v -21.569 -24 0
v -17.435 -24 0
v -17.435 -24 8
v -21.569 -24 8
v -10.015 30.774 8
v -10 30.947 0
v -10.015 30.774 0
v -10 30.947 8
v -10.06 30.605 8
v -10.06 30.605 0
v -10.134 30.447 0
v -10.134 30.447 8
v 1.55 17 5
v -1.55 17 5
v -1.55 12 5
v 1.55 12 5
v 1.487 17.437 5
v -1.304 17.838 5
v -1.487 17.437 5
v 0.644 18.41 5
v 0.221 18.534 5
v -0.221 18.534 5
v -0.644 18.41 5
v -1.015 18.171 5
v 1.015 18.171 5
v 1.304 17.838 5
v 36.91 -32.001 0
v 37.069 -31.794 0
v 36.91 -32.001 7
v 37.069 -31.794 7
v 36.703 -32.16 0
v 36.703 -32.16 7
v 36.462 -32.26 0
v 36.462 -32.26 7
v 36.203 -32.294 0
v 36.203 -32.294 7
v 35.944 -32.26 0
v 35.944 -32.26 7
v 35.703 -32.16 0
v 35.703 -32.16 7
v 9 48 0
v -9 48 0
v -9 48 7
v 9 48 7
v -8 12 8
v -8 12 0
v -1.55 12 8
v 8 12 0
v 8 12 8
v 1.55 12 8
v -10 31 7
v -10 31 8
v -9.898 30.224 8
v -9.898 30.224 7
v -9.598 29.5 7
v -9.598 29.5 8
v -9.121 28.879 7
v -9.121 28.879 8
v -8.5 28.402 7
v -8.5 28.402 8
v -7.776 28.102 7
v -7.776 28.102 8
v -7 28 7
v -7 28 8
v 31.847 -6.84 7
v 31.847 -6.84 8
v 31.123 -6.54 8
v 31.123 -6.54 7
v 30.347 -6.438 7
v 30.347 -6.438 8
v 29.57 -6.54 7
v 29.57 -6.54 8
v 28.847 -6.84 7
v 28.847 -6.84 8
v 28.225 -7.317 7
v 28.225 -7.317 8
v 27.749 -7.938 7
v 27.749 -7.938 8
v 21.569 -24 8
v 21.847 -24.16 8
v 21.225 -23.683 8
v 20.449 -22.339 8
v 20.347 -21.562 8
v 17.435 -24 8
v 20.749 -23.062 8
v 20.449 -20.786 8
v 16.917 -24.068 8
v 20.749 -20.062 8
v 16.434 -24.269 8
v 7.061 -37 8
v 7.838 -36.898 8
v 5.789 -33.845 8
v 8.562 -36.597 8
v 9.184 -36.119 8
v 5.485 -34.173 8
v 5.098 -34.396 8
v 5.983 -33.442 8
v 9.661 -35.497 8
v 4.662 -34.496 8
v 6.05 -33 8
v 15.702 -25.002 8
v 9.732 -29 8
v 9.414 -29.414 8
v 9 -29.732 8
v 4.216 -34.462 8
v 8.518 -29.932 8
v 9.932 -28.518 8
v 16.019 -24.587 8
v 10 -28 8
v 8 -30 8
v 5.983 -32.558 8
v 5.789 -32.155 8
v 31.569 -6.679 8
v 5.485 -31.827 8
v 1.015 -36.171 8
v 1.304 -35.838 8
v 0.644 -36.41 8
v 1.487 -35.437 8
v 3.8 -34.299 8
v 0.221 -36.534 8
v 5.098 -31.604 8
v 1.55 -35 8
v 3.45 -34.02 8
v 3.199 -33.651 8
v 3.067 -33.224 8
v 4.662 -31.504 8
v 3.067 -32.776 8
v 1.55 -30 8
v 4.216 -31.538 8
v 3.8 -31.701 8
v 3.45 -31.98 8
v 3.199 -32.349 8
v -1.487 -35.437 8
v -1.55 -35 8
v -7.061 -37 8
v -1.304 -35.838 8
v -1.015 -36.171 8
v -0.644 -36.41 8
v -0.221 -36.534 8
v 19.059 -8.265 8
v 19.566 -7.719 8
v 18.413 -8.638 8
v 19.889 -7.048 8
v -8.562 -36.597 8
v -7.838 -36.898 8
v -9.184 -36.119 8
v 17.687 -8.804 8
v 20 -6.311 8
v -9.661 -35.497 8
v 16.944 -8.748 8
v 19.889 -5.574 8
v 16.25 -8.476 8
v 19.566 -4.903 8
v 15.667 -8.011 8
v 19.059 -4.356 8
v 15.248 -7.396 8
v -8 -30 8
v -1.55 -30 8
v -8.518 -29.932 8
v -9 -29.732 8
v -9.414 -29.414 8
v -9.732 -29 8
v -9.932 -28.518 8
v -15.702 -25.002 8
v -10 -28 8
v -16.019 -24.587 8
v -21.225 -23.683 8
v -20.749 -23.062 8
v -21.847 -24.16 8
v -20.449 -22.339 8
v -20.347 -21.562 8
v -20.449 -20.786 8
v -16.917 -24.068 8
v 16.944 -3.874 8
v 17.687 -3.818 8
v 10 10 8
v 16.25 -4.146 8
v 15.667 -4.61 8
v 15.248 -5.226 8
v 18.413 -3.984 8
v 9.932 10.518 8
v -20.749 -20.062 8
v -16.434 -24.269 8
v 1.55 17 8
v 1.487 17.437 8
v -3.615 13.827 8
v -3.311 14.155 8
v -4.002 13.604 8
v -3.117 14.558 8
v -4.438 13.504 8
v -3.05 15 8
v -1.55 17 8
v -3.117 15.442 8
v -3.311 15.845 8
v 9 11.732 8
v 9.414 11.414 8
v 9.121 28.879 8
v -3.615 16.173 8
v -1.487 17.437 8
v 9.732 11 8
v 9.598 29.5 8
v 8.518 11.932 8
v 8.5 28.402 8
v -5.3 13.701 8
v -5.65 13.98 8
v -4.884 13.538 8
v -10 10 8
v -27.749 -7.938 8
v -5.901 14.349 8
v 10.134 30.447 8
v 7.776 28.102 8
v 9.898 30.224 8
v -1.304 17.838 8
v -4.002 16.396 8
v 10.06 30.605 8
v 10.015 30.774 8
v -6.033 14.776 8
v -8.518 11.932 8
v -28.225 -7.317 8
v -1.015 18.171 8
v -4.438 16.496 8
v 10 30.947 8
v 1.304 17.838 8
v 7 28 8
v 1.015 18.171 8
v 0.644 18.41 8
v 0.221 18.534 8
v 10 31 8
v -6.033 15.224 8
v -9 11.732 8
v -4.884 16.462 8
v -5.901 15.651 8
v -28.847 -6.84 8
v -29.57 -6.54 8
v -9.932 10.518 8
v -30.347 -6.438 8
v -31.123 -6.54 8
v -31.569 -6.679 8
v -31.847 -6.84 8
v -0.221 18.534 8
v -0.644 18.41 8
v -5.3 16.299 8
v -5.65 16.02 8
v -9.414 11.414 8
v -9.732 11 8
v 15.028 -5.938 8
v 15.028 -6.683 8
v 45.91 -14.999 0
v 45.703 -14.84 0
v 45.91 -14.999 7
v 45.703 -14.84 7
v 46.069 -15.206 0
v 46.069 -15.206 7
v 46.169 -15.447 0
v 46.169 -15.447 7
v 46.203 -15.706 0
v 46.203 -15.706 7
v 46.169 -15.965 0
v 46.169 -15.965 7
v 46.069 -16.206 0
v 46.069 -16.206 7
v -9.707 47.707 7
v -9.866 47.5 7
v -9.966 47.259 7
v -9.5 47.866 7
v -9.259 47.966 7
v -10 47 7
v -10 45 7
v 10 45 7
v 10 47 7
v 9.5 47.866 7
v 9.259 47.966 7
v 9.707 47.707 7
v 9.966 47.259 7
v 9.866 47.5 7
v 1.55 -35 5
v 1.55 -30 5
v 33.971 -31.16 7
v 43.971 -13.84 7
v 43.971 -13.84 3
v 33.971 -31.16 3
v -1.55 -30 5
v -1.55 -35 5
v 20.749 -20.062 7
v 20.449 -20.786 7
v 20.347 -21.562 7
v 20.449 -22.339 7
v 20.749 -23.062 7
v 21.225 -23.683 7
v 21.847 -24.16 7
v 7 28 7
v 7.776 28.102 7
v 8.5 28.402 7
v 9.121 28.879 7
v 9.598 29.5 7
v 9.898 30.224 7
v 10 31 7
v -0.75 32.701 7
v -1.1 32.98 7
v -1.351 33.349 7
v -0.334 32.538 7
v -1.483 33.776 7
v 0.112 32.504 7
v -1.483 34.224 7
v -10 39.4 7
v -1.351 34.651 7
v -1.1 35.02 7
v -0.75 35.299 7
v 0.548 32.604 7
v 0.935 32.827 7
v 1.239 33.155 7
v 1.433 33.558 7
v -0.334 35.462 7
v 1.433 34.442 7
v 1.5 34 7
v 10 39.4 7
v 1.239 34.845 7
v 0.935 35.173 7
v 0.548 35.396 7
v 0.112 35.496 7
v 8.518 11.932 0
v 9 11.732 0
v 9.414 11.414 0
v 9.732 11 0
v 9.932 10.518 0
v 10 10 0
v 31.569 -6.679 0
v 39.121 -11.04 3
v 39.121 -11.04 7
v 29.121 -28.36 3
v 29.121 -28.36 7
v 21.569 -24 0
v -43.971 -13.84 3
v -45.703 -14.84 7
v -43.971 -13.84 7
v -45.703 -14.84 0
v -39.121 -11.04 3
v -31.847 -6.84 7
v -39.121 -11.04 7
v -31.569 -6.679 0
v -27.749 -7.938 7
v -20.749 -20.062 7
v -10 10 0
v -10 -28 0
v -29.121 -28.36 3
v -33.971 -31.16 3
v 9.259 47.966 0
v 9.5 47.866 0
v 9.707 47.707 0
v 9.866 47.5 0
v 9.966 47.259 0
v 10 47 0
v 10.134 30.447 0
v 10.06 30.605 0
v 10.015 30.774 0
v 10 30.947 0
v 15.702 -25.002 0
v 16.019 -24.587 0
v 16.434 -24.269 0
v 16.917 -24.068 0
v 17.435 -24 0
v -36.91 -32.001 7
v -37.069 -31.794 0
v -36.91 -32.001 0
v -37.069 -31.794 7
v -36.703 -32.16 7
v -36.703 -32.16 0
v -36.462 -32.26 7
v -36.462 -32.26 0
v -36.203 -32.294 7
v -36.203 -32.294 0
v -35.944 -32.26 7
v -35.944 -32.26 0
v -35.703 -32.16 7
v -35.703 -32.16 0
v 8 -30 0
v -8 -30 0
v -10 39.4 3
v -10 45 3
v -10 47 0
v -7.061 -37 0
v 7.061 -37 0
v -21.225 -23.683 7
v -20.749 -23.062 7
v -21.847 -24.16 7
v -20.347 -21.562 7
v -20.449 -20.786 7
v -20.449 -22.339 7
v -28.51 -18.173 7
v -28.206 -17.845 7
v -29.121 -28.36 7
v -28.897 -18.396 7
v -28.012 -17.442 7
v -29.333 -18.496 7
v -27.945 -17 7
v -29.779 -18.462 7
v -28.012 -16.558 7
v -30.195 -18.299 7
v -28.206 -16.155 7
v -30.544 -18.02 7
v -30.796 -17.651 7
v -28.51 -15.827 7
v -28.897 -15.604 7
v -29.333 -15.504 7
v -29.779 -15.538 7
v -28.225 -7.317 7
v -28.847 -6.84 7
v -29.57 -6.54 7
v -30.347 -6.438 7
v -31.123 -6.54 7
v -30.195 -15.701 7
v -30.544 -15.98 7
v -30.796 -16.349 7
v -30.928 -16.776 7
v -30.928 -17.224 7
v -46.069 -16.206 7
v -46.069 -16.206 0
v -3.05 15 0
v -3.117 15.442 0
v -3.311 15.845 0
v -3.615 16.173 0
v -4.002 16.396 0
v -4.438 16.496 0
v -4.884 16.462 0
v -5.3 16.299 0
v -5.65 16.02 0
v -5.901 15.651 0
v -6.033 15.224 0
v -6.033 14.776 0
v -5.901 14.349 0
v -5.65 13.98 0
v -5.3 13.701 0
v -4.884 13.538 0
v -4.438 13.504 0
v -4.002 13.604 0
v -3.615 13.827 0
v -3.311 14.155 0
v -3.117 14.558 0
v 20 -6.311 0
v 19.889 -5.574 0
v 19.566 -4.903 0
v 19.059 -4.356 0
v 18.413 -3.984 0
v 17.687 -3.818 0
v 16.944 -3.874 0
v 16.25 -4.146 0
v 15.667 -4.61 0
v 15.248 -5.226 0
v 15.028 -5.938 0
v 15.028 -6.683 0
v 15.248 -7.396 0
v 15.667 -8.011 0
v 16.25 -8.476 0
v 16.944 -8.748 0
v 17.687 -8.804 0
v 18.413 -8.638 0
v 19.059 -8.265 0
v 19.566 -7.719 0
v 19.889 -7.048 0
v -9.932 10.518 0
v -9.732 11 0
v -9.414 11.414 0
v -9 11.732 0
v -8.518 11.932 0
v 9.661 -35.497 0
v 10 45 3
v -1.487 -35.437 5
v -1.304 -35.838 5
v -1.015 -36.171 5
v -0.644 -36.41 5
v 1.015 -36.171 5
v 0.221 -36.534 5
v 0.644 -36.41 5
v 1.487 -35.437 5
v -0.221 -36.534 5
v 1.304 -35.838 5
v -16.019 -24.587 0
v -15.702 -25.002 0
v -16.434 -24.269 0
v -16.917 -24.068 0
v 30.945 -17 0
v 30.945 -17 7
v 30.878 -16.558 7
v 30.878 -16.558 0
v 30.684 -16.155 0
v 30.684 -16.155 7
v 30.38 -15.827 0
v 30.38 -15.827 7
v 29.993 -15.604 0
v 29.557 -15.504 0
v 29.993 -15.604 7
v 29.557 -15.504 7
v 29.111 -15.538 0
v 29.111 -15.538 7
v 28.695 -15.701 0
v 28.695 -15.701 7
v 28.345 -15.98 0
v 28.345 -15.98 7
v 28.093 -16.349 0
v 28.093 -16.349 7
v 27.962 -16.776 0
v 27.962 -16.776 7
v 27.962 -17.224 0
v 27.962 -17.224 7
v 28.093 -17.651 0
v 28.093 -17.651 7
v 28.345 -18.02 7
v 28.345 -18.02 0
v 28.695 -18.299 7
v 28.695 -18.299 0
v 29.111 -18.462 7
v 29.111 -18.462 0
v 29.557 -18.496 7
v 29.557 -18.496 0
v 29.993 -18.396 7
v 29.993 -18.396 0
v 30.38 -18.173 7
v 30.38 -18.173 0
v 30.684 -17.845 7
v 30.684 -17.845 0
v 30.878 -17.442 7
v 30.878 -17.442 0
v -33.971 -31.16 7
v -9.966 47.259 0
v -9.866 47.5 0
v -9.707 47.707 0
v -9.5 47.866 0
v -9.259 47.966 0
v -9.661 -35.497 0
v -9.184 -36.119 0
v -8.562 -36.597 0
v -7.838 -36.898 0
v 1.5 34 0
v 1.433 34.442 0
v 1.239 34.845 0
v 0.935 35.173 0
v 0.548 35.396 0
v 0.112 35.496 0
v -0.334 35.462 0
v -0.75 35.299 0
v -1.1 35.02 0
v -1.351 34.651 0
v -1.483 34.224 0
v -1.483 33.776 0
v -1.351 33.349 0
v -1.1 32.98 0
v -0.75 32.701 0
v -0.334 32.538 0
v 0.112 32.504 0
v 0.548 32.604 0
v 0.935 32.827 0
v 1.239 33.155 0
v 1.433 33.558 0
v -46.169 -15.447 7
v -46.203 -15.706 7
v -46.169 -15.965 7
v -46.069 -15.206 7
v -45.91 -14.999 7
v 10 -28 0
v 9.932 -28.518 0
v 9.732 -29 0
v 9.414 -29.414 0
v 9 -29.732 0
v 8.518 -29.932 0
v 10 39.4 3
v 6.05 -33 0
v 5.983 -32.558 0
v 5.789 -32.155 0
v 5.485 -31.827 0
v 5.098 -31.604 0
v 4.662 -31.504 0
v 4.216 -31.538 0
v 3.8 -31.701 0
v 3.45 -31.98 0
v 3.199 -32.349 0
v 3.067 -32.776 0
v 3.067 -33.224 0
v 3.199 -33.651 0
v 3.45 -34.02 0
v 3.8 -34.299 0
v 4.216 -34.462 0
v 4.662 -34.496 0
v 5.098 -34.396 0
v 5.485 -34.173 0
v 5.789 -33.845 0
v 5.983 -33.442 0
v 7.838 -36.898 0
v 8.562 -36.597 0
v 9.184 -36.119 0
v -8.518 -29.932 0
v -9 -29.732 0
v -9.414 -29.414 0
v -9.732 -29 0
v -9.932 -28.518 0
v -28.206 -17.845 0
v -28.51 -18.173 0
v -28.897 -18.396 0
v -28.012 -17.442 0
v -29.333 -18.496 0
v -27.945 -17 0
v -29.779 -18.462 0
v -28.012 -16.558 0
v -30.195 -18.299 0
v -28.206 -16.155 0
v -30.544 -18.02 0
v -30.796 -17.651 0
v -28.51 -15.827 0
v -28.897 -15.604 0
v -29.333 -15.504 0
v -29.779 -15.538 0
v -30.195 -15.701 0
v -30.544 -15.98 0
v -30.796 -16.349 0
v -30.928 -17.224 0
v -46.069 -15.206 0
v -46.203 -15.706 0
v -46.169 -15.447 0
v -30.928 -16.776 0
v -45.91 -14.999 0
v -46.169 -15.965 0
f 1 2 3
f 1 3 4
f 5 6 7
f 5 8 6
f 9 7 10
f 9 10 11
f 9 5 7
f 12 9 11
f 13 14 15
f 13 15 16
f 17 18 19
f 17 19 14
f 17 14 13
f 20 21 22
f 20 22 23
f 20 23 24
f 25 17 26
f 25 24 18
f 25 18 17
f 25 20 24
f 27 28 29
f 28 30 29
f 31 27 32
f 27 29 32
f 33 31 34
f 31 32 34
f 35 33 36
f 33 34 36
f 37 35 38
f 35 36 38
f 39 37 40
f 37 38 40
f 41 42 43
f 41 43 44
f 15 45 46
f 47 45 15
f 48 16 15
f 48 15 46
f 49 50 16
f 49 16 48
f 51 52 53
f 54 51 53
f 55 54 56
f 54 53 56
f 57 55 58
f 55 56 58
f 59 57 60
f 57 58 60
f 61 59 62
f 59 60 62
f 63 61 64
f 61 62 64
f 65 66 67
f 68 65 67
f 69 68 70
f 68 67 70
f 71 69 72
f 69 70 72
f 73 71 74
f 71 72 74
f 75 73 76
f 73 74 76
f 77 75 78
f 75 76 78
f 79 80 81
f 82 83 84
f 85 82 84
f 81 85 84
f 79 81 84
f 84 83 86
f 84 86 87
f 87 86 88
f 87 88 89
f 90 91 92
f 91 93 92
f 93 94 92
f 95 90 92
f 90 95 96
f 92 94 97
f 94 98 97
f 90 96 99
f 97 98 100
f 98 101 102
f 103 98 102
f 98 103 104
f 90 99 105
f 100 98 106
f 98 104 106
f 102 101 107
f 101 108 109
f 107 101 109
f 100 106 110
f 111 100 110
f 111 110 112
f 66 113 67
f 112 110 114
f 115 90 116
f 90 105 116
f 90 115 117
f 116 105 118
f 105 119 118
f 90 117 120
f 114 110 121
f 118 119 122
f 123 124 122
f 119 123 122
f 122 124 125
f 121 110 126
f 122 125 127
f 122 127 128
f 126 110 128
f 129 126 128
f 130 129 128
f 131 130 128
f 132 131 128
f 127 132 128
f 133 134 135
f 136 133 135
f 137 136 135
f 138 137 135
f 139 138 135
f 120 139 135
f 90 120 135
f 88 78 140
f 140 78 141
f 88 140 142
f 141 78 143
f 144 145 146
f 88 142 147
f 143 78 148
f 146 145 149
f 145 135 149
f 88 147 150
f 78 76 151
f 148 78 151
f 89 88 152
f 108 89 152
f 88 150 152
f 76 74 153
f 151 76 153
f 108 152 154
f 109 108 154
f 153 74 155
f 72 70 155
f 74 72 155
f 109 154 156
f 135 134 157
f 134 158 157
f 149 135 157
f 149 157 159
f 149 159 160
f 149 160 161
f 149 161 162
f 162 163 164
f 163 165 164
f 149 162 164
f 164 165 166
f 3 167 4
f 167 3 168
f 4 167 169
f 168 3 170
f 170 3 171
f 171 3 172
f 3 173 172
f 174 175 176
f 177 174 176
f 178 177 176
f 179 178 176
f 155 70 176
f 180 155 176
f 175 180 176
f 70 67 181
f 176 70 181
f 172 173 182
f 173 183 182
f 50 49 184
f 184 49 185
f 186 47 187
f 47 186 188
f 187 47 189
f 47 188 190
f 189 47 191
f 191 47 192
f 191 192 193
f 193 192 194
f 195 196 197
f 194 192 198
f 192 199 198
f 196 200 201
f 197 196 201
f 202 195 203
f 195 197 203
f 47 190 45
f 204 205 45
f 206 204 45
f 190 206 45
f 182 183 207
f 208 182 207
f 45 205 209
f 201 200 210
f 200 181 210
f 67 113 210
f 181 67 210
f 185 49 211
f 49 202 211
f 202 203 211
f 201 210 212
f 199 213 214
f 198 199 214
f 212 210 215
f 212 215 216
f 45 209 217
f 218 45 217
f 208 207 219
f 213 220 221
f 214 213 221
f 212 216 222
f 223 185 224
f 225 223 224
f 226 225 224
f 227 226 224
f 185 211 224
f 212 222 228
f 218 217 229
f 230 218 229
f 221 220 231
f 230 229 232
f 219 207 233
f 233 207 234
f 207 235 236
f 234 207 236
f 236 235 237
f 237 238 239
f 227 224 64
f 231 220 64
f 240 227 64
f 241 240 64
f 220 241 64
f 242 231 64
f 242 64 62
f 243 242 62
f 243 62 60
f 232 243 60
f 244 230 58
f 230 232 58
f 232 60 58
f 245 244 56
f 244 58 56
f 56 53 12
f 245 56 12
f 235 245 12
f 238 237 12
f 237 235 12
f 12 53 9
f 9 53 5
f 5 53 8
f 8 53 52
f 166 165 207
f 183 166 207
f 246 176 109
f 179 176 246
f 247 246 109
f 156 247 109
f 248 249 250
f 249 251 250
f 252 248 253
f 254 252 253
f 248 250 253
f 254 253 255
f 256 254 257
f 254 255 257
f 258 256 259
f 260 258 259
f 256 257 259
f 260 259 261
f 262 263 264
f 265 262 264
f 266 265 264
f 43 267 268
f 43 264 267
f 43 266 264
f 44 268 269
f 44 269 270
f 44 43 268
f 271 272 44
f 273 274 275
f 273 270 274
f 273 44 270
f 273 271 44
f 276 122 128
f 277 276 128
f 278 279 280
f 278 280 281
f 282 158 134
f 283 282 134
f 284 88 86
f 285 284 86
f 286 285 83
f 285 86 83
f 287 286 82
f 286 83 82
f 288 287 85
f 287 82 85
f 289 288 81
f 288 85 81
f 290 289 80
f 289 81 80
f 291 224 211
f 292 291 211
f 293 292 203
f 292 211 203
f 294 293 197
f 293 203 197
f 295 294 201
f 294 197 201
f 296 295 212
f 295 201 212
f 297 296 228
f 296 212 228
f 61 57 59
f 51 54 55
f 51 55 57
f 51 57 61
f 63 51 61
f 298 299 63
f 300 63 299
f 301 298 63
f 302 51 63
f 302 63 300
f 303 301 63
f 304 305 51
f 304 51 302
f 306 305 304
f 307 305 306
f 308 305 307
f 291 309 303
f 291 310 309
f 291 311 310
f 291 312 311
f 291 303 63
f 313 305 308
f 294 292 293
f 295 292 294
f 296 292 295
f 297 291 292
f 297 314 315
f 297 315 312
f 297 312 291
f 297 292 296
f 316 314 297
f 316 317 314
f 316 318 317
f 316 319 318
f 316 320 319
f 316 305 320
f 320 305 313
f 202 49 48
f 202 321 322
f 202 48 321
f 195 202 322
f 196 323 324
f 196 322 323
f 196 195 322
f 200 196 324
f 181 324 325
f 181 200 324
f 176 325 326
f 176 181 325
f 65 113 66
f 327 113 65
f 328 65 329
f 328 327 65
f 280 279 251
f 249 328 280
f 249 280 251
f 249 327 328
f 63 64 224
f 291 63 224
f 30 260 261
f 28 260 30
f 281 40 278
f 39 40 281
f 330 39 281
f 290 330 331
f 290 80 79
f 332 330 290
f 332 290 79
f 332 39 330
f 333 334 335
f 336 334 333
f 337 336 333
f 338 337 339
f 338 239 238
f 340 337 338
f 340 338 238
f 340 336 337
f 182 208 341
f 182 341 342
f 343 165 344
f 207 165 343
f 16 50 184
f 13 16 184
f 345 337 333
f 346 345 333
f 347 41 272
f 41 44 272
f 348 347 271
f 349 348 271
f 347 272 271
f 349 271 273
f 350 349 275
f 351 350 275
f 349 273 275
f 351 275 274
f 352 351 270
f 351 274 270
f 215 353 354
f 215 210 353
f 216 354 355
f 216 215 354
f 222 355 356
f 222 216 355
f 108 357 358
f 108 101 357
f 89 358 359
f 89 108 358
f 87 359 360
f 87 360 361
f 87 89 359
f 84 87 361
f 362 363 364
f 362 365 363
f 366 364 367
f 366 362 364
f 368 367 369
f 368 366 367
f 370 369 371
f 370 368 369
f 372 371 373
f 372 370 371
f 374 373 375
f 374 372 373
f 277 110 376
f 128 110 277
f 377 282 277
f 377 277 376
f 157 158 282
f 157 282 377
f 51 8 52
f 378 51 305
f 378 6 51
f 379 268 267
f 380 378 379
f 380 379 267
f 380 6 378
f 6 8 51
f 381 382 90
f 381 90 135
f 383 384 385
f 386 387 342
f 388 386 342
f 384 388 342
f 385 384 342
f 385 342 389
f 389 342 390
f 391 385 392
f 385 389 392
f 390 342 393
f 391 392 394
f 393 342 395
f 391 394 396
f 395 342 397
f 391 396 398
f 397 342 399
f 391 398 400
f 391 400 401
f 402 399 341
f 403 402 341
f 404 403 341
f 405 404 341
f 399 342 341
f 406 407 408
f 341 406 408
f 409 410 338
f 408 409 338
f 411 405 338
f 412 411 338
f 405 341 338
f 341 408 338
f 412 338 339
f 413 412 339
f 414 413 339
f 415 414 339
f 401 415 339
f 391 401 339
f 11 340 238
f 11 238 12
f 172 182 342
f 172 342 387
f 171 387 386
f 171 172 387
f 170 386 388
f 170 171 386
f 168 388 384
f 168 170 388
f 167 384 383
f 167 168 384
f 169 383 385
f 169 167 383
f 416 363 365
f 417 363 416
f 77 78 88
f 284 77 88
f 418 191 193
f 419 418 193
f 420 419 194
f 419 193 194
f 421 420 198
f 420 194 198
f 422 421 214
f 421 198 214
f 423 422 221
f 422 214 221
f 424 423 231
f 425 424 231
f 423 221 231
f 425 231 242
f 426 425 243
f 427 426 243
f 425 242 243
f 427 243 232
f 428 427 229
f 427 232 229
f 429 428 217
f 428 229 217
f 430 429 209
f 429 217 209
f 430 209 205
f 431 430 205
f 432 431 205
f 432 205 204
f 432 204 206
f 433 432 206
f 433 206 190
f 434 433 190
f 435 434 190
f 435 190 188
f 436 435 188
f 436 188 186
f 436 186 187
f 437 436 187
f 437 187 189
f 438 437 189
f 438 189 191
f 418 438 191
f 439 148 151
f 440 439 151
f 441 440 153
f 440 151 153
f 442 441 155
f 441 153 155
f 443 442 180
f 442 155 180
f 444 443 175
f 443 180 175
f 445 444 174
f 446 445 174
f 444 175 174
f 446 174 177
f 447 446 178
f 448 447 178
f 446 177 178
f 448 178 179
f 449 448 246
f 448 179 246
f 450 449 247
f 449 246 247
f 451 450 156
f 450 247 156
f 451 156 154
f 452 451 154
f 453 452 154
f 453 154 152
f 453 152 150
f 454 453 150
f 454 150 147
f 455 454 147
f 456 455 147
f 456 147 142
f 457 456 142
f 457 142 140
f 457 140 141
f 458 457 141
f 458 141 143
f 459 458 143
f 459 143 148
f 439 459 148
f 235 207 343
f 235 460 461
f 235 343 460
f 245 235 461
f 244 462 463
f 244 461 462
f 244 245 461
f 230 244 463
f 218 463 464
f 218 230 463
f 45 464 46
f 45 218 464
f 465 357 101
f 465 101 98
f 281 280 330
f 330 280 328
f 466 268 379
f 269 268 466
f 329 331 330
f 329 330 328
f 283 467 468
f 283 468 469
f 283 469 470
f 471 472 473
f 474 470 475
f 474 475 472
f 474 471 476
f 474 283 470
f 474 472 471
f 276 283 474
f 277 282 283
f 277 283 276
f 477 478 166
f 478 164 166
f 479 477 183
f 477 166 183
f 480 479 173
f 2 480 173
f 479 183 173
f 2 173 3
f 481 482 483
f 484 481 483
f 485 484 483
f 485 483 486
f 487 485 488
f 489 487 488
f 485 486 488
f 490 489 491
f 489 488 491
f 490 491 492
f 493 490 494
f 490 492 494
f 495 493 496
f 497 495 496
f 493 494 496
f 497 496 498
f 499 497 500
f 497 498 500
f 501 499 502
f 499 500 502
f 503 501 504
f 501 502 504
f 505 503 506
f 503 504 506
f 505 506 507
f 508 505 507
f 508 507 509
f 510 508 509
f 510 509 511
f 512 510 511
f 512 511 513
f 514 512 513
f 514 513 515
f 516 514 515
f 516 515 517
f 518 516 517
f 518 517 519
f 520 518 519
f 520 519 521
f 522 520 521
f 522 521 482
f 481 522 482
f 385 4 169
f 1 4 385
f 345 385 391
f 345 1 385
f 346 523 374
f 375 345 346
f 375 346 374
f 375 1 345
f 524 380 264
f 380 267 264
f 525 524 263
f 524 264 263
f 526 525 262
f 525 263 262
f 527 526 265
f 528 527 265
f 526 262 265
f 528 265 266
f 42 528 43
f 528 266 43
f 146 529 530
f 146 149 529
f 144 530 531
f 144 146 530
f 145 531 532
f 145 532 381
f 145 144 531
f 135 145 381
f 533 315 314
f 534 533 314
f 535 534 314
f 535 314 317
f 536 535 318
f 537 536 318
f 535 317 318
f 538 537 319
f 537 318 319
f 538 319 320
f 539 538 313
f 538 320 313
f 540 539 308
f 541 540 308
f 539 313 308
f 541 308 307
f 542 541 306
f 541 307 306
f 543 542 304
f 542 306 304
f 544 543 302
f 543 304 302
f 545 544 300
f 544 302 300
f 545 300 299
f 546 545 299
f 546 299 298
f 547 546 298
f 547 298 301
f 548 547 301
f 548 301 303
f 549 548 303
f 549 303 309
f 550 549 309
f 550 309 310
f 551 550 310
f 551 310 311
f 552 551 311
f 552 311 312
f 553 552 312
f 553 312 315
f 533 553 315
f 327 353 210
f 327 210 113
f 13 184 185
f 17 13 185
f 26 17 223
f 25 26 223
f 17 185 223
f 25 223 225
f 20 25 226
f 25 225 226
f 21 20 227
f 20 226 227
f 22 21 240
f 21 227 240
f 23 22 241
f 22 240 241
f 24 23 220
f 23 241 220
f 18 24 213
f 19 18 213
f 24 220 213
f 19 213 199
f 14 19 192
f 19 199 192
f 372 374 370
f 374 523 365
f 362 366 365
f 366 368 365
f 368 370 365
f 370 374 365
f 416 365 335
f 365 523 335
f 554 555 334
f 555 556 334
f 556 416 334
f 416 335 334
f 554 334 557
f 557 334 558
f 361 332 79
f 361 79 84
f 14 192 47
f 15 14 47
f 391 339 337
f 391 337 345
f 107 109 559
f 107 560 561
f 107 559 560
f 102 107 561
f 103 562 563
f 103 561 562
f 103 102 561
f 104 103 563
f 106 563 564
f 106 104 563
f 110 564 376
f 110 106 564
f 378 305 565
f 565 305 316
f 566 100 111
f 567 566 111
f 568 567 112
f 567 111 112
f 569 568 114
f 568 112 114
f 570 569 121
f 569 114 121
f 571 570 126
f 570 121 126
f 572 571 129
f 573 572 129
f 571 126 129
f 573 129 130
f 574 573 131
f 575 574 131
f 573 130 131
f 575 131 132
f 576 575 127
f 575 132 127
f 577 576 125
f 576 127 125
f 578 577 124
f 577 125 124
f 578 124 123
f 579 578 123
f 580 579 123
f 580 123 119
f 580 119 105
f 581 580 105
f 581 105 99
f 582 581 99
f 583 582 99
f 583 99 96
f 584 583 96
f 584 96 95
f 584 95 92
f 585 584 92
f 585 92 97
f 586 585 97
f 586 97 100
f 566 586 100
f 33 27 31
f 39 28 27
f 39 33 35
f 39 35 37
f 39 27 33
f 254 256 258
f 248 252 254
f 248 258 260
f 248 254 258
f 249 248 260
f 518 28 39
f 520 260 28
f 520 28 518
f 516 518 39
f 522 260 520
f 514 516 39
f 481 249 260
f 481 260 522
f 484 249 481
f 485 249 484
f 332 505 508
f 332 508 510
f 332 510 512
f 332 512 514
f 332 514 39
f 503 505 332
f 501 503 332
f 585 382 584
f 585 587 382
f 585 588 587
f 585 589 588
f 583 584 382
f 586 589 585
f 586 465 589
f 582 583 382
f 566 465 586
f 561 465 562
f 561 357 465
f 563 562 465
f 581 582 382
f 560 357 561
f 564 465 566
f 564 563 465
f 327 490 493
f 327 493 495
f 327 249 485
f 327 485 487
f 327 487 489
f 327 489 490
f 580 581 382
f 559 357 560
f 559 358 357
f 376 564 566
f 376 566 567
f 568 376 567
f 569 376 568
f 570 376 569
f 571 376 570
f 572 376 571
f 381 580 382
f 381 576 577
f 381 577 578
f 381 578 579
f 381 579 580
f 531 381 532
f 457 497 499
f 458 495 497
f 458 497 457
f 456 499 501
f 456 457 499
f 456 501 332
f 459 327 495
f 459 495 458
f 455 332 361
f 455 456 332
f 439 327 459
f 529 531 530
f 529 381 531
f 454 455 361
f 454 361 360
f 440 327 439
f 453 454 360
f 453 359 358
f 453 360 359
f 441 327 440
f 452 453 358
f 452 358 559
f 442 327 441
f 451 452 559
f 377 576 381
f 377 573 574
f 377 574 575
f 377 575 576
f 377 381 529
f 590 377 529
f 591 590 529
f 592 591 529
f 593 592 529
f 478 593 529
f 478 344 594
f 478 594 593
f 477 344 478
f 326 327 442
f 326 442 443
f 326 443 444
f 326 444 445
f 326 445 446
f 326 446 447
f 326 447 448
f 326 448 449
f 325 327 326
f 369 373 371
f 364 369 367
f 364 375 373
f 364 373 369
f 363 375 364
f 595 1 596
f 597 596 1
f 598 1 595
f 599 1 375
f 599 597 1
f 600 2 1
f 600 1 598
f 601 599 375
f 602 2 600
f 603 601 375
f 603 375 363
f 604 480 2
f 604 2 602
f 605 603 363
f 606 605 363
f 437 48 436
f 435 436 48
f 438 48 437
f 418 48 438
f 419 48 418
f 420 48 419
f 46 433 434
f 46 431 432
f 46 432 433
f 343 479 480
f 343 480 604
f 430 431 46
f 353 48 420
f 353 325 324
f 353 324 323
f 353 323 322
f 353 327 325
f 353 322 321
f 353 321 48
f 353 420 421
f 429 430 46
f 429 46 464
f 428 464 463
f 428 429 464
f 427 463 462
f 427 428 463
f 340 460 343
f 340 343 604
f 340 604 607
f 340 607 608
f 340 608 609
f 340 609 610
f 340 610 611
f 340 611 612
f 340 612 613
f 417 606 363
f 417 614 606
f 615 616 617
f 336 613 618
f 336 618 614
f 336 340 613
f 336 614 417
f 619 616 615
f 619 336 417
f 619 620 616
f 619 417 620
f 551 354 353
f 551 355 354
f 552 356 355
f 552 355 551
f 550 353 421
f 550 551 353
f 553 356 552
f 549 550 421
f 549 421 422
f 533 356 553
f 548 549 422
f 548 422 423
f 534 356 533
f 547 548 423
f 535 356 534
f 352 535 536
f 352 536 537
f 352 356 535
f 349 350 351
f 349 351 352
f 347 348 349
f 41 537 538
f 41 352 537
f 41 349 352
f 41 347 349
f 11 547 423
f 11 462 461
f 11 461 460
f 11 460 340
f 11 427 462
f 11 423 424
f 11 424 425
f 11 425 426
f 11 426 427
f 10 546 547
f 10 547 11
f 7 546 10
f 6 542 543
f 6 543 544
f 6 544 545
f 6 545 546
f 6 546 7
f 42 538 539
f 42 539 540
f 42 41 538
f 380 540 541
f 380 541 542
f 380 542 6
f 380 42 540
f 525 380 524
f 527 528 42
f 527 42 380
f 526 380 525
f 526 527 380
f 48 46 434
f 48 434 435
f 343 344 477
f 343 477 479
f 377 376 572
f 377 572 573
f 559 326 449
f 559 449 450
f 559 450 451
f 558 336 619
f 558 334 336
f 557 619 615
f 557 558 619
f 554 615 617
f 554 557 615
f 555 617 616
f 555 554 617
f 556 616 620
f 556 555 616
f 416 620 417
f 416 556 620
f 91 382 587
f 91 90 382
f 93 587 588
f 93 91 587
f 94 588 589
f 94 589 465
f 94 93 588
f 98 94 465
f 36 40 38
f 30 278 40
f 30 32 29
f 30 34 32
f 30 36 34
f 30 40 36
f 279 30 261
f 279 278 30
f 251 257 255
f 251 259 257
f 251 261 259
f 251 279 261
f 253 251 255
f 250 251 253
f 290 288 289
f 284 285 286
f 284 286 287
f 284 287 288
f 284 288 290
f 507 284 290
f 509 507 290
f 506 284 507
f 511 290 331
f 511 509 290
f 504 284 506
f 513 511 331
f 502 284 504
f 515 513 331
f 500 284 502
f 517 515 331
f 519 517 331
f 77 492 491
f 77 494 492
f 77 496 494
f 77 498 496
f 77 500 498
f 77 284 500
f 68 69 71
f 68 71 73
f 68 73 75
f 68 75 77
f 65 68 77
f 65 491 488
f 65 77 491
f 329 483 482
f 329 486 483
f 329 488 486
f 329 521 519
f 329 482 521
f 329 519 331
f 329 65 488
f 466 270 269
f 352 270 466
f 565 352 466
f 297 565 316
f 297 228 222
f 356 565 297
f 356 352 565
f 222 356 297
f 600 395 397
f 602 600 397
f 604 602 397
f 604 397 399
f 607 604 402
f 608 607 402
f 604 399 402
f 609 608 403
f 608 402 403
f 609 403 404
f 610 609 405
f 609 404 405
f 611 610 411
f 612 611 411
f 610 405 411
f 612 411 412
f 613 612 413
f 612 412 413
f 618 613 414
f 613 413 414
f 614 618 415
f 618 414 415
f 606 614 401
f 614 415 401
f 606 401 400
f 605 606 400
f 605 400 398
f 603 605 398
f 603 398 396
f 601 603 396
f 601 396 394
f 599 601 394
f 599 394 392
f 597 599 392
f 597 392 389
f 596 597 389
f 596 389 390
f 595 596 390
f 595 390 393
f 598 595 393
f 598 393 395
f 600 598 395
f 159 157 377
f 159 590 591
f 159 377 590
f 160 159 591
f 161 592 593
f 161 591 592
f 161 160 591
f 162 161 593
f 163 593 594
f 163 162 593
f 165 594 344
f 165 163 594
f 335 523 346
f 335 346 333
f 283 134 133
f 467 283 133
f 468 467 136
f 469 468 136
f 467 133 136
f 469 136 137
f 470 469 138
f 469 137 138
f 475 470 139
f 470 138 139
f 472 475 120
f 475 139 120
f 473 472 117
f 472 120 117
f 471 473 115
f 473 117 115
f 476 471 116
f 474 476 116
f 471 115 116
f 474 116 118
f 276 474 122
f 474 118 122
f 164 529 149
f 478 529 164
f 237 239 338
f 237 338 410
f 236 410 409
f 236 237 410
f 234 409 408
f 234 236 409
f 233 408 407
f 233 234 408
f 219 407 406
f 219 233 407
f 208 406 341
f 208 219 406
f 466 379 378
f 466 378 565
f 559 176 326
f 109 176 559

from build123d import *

# Parameters (mm, degrees)
BOSS_EXTRUDE1_DEPTH = 8
CUT_EXTRUDE1_DEPTH  = 1
SKETCH3_R           = 1.5
CUT_EXTRUDE2_DEPTH  = 68.243529011
SKETCH4_W           = 20
SKETCH4_H           = 5.6
CUT_EXTRUDE3_DEPTH  = 4
SKETCH5_R           = 1.5
SKETCH5_R_2         = 2.5
CUT_EXTRUDE5_DEPTH  = 68.35497156
CUT_EXTRUDE6_DEPTH  = 3
FILLET1_R           = 1
FILLET2_R           = 3
FILLET3_R           = 2
FILLET4_R           = 1
FILLET6_R           = 1


with BuildPart() as part:
    # Sketch1 → Boss-Extrude1 (new body)
    with BuildSketch(Plane.XY):
        Polygon((-10, 30.679491924), (-10, 48), (10, 48), (10, 30.679491924), (31.569219382, -6.679491924), (46.569219382, -15.339745962), (36.569219382, -32.660254038), (21.569219382, -24), (16.278513086, -24), (8.795198312, -37), (-8.795198312, -37), (-16.278513086, -24), (-21.569219382, -24), (-36.569219382, -32.660254038), (-46.569219382, -15.339745962), (-31.569219382, -6.679491924), align=None)
    extrude(amount=BOSS_EXTRUDE1_DEPTH)

    # Sketch2 → Cut-Extrude1 (cut)
    with BuildSketch(Plane.XY.offset(8)):
        with BuildLine():
            Line((-36.569219382, -32.660254038), (-46.569219382, -15.339745962))
            Line((-46.569219382, -15.339745962), (-31.846787517, -6.839745962))
            ThreePointArc((-31.846787517, -6.839745962), (-29.570330382, -6.540044695), (-27.748711306, -7.937822174))
            Line((-27.748711306, -7.937822174), (-20.748711306, -20.062177826))
            ThreePointArc((-20.748711306, -20.062177826), (-20.449010038, -22.338634962), (-21.846787517, -24.160254038))
            Line((-21.846787517, -24.160254038), (-36.569219382, -32.660254038))
        make_face()
        with BuildLine():
            Line((-7, 28), (7, 28))
            ThreePointArc((7, 28), (9.121320344, 28.878679656), (10, 31))
            Line((10, 31), (10, 48))
            Line((10, 48), (-10, 48))
            Line((-10, 48), (-10, 31))
            ThreePointArc((-10, 31), (-9.121320344, 28.878679656), (-7, 28))
        make_face()
        with BuildLine():
            Line((36.569219382, -32.660254038), (46.569219382, -15.339745962))
            Line((46.569219382, -15.339745962), (31.846787517, -6.839745962))
            ThreePointArc((31.846787517, -6.839745962), (29.570330382, -6.540044695), (27.748711306, -7.937822174))
            Line((27.748711306, -7.937822174), (20.748711306, -20.062177826))
            ThreePointArc((20.748711306, -20.062177826), (20.449010038, -22.338634962), (21.846787517, -24.160254038))
            Line((21.846787517, -24.160254038), (36.569219382, -32.660254038))
        make_face()
    extrude(amount=-CUT_EXTRUDE1_DEPTH, mode=Mode.SUBTRACT)

    # Sketch3 → Cut-Extrude2 (cut, through all)
    with BuildSketch(Plane.XY.offset(7)):
        with Locations((0, 34)):
            Circle(SKETCH3_R)
        with Locations((29.444863729, -17)):
            Circle(SKETCH3_R)
        with Locations((-29.444863729, -17)):
            Circle(SKETCH3_R)
    extrude(amount=-CUT_EXTRUDE2_DEPTH, mode=Mode.SUBTRACT)

    # Sketch4 → Cut-Extrude3 (cut)
    with BuildSketch(Plane.XY.offset(7)):
        with Locations((0, 42.2)):
            Rectangle(SKETCH4_W, SKETCH4_H)
        Polygon((39.121400909, -11.039745962), (43.97114317, -13.839745962), (33.97114317, -31.160254038), (29.121400909, -28.360254038), align=None)
        Polygon((-43.97114317, -13.839745962), (-39.121400909, -11.039745962), (-29.121400909, -28.360254038), (-33.97114317, -31.160254038), align=None)
    extrude(amount=-CUT_EXTRUDE3_DEPTH, mode=Mode.SUBTRACT)

    # Sketch5 → Cut-Extrude5 (cut, through all)
    with BuildSketch(Plane.XY.offset(8)):
        with BuildLine():
            ThreePointArc((-10, -28), (-9.414213562, -29.414213562), (-8, -30))
            Line((-8, -30), (8, -30))
            ThreePointArc((8, -30), (9.414213562, -29.414213562), (10, -28))
            Line((10, -28), (10, 10))
            ThreePointArc((10, 10), (9.414213562, 11.414213562), (8, 12))
            Line((8, 12), (-8, 12))
            ThreePointArc((-8, 12), (-9.414213562, 11.414213562), (-10, 10))
            Line((-10, 10), (-10, -28))
        make_face()
        with Locations((4.55, -33)):
            Circle(SKETCH5_R)
        with Locations((-4.55, 15)):
            Circle(SKETCH5_R)
        with Locations((17.5, -6.310889132)):
            Circle(SKETCH5_R_2)
    extrude(amount=-CUT_EXTRUDE5_DEPTH, mode=Mode.SUBTRACT)

    # Sketch5<3> → Cut-Extrude6 (cut)
    with BuildSketch(Plane.XY.offset(8)):
        with BuildLine():
            Line((1.55, -30), (-1.55, -30))
            Line((-1.55, -30), (-1.55, -35))
            ThreePointArc((-1.55, -35), (0, -36.55), (1.55, -35))
            Line((1.55, -35), (1.55, -30))
        make_face()
        with BuildLine():
            Line((-1.55, 17), (-1.55, 12))
            Line((-1.55, 12), (1.55, 12))
            Line((1.55, 12), (1.55, 17))
            ThreePointArc((1.55, 17), (0, 18.55), (-1.55, 17))
        make_face()
    extrude(amount=-CUT_EXTRUDE6_DEPTH, mode=Mode.SUBTRACT)

    # Fillet1
    fillet1_edges = [part.edges().sort_by_distance(p)[0] for p in [
        (10, 48, 3.5),
        (-10, 48, 3.5),
        (-36.569219382, -32.660254038, 3.5),
        (-46.569219382, -15.339745962, 3.5),
        (36.569219382, -32.660254038, 3.5),
        (46.569219382, -15.339745962, 3.5),
    ]]
    fillet(fillet1_edges, radius=FILLET1_R)

    # Fillet2
    fillet2_edges = [part.edges().sort_by_distance(p)[0] for p in [
        (-8.795198312, -37, 4),
        (8.795198312, -37, 4),
    ]]
    fillet(fillet2_edges, radius=FILLET2_R)

    # Fillet3
    fillet3_edges = [part.edges().sort_by_distance(p)[0] for p in [
        (16.278513086, -24, 4),
        (-16.278513086, -24, 4),
    ]]
    fillet(fillet3_edges, radius=FILLET3_R)

    # Fillet4
    fillet4_edges = [part.edges().sort_by_distance(p)[0] for p in [
        (10, 30.679491924, 4),
    ]]
    fillet(fillet4_edges, radius=FILLET4_R)

    # Fillet6
    fillet6_edges = [part.edges().sort_by_distance(p)[0] for p in [
        (-10, 30.679491924, 4),
    ]]
    fillet(fillet6_edges, radius=FILLET6_R)


solid = part.part
